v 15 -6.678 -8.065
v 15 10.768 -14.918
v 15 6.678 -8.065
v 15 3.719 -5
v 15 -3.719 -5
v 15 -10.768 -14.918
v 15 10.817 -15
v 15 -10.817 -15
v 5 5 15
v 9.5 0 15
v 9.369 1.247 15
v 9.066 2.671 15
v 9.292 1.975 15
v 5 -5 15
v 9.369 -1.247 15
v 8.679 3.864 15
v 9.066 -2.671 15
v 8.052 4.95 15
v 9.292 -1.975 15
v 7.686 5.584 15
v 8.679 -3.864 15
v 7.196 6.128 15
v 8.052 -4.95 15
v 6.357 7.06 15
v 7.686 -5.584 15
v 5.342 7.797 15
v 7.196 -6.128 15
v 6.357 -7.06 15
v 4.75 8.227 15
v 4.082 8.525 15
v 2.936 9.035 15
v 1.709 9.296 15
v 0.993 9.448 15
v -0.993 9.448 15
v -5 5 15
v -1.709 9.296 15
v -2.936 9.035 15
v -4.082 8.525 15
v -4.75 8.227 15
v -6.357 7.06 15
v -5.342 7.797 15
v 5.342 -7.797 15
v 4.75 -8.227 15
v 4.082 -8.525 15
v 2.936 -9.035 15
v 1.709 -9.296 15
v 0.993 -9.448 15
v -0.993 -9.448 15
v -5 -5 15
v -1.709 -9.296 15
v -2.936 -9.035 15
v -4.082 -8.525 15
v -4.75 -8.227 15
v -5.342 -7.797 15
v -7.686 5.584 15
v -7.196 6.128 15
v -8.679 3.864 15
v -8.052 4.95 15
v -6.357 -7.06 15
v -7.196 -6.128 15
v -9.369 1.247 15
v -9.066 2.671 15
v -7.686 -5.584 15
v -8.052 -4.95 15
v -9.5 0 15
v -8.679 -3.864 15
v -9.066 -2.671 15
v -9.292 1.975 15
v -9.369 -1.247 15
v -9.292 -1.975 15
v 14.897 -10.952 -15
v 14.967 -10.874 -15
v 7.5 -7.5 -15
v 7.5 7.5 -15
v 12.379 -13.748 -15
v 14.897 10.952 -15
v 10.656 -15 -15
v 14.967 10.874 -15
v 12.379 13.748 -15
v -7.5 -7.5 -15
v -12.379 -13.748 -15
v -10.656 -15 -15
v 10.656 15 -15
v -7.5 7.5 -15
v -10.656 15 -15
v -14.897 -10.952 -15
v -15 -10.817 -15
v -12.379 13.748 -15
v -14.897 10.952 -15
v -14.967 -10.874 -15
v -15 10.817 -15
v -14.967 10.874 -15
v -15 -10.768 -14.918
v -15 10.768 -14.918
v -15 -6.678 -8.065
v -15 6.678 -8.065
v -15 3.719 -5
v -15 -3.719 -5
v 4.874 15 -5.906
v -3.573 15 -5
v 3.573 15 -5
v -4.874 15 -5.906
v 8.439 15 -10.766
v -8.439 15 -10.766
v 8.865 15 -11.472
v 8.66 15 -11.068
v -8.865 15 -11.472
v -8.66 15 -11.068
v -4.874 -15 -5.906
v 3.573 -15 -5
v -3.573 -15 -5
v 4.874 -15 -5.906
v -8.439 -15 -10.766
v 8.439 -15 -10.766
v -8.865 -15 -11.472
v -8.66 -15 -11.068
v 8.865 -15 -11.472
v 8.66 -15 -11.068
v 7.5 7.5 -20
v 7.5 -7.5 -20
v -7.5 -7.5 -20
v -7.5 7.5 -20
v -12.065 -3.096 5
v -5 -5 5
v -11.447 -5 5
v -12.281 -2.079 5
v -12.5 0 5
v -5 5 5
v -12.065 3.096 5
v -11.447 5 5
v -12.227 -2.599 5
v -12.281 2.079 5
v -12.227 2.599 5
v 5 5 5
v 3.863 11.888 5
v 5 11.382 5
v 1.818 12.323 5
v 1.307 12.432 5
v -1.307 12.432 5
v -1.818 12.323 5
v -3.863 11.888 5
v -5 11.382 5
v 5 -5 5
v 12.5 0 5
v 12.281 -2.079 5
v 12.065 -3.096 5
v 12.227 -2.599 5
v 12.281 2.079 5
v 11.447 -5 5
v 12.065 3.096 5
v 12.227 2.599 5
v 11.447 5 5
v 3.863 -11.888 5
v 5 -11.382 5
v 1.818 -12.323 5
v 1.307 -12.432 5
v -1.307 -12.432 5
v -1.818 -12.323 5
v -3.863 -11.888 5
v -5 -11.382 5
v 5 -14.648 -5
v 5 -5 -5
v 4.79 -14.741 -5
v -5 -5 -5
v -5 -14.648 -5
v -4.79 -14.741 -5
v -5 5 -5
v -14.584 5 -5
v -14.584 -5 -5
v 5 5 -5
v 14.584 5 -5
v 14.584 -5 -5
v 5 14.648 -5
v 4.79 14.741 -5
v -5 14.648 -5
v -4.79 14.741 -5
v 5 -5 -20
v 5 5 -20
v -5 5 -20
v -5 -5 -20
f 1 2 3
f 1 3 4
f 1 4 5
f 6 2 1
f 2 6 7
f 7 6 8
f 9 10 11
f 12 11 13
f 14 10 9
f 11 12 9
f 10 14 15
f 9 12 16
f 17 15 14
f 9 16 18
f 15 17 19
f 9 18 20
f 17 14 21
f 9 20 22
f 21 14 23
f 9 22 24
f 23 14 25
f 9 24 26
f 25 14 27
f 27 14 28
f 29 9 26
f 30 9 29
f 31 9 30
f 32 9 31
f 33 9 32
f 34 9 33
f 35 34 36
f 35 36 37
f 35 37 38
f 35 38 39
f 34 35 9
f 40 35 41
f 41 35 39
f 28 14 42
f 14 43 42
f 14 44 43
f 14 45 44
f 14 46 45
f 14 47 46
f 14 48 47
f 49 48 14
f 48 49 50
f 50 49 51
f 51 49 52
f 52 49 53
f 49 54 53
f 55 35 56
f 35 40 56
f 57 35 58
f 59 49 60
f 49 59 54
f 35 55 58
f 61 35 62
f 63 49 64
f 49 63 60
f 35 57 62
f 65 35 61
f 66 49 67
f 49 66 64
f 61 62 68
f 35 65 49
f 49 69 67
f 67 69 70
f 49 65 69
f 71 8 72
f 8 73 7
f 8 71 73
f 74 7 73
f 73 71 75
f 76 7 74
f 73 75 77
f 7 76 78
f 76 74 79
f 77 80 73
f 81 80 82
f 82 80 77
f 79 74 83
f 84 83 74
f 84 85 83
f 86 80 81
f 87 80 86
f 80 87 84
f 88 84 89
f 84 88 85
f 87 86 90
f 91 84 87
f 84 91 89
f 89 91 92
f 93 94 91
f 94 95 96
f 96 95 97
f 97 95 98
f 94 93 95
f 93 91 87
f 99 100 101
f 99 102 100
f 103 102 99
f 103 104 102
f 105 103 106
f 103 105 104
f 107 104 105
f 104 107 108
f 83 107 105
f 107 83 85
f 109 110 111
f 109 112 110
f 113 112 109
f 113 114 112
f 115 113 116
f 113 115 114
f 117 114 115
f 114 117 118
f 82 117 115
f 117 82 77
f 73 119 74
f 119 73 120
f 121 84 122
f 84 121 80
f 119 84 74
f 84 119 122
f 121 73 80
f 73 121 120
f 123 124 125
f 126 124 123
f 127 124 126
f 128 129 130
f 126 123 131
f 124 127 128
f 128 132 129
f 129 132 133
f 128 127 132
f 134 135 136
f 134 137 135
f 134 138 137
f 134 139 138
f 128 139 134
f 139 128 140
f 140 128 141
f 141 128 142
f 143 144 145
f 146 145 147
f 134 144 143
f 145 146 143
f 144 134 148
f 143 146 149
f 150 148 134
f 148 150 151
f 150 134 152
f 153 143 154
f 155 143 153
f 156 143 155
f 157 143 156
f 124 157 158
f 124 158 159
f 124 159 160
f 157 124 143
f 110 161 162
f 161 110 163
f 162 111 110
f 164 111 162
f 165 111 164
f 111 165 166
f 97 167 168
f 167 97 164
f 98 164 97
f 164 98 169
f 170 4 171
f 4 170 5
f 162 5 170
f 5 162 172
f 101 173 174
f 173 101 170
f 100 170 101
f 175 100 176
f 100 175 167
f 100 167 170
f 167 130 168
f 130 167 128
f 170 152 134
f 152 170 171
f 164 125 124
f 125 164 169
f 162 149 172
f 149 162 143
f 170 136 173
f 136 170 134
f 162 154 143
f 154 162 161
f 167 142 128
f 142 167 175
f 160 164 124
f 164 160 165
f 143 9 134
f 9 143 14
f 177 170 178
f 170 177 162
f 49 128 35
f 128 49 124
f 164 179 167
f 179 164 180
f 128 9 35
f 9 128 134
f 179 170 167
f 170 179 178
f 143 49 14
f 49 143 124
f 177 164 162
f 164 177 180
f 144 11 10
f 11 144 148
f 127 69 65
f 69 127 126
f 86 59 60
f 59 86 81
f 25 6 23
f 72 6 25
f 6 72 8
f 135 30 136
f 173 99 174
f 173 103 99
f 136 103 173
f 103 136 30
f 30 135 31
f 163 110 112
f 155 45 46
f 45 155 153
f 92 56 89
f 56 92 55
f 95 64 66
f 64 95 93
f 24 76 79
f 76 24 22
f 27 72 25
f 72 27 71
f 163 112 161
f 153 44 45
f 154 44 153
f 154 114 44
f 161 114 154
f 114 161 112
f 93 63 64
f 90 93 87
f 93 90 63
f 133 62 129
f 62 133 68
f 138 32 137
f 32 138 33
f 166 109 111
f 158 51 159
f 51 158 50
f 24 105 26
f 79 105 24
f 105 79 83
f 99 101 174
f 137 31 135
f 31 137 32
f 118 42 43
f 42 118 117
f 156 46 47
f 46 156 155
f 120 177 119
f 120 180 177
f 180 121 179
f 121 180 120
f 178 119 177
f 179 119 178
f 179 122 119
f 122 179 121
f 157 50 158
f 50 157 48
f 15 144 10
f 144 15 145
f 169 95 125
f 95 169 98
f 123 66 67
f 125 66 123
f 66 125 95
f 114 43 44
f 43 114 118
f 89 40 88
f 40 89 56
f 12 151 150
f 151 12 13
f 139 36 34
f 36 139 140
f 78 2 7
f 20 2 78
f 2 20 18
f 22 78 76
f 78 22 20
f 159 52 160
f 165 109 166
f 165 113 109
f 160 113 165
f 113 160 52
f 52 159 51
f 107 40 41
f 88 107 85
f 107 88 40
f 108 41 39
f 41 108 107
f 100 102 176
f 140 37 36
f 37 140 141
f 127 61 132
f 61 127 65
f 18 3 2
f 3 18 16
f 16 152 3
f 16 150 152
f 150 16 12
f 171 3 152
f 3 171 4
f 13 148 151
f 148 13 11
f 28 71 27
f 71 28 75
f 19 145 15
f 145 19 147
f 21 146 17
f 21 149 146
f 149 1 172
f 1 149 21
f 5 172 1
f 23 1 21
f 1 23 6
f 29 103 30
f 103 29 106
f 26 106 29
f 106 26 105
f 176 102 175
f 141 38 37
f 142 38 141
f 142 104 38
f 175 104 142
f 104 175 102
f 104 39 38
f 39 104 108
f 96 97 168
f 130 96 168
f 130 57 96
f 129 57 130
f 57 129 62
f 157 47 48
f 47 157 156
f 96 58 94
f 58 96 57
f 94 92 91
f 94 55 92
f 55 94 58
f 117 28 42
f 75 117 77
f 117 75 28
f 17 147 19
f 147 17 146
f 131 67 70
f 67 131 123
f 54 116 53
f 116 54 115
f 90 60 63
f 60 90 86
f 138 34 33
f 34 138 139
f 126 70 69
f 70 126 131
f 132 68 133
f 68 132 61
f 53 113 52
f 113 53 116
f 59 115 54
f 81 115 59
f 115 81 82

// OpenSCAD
//created with rubyscad 1.0

intersection() {
   difference() {
      union() {
         cube(size = 30, center = true); 
         translate(v = [0.000, 0.000, -25]) 
         cube(size = [15, 15, 50], center = true); 
      }
      union() {
         cube(size = [50, 10, 10], center = true); 
         cube(size = [10, 50, 10], center = true); 
         cube(size = [10, 10, 50], center = true); 
      }
   }
   translate(v = [0.000, 0.000, 5]) 
   cylinder(h = 50, r1 = 20, r2 = 5, center = true); 
}
